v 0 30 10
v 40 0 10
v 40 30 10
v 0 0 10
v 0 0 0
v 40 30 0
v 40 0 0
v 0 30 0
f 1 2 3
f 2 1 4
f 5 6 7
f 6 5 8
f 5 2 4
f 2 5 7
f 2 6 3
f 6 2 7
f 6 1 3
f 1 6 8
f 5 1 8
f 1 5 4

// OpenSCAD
// Teaching model, not a production chassis.
step = 1;
$fn = 32;
pcb_w = 78;
pcb_l = 56;
wall = 2;
floor_t = 2;
height = 20;
holes = [[9, 8], [69, 8], [9, 48], [69, 48]];

module outline() {
    if (step < 6) square([pcb_w, pcb_l]);
    else hull()
        for (x = [4, pcb_w - 4], y = [4, pcb_l - 4])
            translate([x, y]) circle(r = 4);
}

module body() {
    difference() {
        union() {
            difference() {
                linear_extrude(height) outline();
                translate([wall, wall, step >= 5 ? floor_t : -1])
                    cube([pcb_w - 2 * wall, pcb_l - 2 * wall, height + 2]);
            }
            if (step >= 8)
                for (p = holes)
                    translate([p[0], p[1], 0]) cylinder(h = 8, d = 7);
        }
        if (step >= 7)
            for (p = holes)
                translate([p[0], p[1], -1]) cylinder(h = height + 2, d = 2.4);
        if (step >= 9)
            for (x = [-1, pcb_w - 9])
                translate([x, 18, -1]) cube([10, 22, height + 2]);
    }
}

if (step == 1) color("orange") cube([40, 30, 10]);
else if (step == 2) color("orange") cube([pcb_w, pcb_l, height]);
else if (step == 3) {
    color("orange") cube([pcb_w, pcb_l, height]);
    color("cyan", 0.6)
        translate([wall, wall, height + 8])
            cube([pcb_w - 2 * wall, pcb_l - 2 * wall, height]);
} else {
    color("orange") body();
    if (step >= 10)
        color("green", 0.6)
            translate([8, 8, step == 12 ? 34 : 9])
                cube([pcb_w - 16, pcb_l - 16, 1.6]);
    if (step >= 11)
        color("slategray", 0.8)
            translate([0, 0, step == 12 ? 52 : height + 1])
                linear_extrude(2) outline();
}
